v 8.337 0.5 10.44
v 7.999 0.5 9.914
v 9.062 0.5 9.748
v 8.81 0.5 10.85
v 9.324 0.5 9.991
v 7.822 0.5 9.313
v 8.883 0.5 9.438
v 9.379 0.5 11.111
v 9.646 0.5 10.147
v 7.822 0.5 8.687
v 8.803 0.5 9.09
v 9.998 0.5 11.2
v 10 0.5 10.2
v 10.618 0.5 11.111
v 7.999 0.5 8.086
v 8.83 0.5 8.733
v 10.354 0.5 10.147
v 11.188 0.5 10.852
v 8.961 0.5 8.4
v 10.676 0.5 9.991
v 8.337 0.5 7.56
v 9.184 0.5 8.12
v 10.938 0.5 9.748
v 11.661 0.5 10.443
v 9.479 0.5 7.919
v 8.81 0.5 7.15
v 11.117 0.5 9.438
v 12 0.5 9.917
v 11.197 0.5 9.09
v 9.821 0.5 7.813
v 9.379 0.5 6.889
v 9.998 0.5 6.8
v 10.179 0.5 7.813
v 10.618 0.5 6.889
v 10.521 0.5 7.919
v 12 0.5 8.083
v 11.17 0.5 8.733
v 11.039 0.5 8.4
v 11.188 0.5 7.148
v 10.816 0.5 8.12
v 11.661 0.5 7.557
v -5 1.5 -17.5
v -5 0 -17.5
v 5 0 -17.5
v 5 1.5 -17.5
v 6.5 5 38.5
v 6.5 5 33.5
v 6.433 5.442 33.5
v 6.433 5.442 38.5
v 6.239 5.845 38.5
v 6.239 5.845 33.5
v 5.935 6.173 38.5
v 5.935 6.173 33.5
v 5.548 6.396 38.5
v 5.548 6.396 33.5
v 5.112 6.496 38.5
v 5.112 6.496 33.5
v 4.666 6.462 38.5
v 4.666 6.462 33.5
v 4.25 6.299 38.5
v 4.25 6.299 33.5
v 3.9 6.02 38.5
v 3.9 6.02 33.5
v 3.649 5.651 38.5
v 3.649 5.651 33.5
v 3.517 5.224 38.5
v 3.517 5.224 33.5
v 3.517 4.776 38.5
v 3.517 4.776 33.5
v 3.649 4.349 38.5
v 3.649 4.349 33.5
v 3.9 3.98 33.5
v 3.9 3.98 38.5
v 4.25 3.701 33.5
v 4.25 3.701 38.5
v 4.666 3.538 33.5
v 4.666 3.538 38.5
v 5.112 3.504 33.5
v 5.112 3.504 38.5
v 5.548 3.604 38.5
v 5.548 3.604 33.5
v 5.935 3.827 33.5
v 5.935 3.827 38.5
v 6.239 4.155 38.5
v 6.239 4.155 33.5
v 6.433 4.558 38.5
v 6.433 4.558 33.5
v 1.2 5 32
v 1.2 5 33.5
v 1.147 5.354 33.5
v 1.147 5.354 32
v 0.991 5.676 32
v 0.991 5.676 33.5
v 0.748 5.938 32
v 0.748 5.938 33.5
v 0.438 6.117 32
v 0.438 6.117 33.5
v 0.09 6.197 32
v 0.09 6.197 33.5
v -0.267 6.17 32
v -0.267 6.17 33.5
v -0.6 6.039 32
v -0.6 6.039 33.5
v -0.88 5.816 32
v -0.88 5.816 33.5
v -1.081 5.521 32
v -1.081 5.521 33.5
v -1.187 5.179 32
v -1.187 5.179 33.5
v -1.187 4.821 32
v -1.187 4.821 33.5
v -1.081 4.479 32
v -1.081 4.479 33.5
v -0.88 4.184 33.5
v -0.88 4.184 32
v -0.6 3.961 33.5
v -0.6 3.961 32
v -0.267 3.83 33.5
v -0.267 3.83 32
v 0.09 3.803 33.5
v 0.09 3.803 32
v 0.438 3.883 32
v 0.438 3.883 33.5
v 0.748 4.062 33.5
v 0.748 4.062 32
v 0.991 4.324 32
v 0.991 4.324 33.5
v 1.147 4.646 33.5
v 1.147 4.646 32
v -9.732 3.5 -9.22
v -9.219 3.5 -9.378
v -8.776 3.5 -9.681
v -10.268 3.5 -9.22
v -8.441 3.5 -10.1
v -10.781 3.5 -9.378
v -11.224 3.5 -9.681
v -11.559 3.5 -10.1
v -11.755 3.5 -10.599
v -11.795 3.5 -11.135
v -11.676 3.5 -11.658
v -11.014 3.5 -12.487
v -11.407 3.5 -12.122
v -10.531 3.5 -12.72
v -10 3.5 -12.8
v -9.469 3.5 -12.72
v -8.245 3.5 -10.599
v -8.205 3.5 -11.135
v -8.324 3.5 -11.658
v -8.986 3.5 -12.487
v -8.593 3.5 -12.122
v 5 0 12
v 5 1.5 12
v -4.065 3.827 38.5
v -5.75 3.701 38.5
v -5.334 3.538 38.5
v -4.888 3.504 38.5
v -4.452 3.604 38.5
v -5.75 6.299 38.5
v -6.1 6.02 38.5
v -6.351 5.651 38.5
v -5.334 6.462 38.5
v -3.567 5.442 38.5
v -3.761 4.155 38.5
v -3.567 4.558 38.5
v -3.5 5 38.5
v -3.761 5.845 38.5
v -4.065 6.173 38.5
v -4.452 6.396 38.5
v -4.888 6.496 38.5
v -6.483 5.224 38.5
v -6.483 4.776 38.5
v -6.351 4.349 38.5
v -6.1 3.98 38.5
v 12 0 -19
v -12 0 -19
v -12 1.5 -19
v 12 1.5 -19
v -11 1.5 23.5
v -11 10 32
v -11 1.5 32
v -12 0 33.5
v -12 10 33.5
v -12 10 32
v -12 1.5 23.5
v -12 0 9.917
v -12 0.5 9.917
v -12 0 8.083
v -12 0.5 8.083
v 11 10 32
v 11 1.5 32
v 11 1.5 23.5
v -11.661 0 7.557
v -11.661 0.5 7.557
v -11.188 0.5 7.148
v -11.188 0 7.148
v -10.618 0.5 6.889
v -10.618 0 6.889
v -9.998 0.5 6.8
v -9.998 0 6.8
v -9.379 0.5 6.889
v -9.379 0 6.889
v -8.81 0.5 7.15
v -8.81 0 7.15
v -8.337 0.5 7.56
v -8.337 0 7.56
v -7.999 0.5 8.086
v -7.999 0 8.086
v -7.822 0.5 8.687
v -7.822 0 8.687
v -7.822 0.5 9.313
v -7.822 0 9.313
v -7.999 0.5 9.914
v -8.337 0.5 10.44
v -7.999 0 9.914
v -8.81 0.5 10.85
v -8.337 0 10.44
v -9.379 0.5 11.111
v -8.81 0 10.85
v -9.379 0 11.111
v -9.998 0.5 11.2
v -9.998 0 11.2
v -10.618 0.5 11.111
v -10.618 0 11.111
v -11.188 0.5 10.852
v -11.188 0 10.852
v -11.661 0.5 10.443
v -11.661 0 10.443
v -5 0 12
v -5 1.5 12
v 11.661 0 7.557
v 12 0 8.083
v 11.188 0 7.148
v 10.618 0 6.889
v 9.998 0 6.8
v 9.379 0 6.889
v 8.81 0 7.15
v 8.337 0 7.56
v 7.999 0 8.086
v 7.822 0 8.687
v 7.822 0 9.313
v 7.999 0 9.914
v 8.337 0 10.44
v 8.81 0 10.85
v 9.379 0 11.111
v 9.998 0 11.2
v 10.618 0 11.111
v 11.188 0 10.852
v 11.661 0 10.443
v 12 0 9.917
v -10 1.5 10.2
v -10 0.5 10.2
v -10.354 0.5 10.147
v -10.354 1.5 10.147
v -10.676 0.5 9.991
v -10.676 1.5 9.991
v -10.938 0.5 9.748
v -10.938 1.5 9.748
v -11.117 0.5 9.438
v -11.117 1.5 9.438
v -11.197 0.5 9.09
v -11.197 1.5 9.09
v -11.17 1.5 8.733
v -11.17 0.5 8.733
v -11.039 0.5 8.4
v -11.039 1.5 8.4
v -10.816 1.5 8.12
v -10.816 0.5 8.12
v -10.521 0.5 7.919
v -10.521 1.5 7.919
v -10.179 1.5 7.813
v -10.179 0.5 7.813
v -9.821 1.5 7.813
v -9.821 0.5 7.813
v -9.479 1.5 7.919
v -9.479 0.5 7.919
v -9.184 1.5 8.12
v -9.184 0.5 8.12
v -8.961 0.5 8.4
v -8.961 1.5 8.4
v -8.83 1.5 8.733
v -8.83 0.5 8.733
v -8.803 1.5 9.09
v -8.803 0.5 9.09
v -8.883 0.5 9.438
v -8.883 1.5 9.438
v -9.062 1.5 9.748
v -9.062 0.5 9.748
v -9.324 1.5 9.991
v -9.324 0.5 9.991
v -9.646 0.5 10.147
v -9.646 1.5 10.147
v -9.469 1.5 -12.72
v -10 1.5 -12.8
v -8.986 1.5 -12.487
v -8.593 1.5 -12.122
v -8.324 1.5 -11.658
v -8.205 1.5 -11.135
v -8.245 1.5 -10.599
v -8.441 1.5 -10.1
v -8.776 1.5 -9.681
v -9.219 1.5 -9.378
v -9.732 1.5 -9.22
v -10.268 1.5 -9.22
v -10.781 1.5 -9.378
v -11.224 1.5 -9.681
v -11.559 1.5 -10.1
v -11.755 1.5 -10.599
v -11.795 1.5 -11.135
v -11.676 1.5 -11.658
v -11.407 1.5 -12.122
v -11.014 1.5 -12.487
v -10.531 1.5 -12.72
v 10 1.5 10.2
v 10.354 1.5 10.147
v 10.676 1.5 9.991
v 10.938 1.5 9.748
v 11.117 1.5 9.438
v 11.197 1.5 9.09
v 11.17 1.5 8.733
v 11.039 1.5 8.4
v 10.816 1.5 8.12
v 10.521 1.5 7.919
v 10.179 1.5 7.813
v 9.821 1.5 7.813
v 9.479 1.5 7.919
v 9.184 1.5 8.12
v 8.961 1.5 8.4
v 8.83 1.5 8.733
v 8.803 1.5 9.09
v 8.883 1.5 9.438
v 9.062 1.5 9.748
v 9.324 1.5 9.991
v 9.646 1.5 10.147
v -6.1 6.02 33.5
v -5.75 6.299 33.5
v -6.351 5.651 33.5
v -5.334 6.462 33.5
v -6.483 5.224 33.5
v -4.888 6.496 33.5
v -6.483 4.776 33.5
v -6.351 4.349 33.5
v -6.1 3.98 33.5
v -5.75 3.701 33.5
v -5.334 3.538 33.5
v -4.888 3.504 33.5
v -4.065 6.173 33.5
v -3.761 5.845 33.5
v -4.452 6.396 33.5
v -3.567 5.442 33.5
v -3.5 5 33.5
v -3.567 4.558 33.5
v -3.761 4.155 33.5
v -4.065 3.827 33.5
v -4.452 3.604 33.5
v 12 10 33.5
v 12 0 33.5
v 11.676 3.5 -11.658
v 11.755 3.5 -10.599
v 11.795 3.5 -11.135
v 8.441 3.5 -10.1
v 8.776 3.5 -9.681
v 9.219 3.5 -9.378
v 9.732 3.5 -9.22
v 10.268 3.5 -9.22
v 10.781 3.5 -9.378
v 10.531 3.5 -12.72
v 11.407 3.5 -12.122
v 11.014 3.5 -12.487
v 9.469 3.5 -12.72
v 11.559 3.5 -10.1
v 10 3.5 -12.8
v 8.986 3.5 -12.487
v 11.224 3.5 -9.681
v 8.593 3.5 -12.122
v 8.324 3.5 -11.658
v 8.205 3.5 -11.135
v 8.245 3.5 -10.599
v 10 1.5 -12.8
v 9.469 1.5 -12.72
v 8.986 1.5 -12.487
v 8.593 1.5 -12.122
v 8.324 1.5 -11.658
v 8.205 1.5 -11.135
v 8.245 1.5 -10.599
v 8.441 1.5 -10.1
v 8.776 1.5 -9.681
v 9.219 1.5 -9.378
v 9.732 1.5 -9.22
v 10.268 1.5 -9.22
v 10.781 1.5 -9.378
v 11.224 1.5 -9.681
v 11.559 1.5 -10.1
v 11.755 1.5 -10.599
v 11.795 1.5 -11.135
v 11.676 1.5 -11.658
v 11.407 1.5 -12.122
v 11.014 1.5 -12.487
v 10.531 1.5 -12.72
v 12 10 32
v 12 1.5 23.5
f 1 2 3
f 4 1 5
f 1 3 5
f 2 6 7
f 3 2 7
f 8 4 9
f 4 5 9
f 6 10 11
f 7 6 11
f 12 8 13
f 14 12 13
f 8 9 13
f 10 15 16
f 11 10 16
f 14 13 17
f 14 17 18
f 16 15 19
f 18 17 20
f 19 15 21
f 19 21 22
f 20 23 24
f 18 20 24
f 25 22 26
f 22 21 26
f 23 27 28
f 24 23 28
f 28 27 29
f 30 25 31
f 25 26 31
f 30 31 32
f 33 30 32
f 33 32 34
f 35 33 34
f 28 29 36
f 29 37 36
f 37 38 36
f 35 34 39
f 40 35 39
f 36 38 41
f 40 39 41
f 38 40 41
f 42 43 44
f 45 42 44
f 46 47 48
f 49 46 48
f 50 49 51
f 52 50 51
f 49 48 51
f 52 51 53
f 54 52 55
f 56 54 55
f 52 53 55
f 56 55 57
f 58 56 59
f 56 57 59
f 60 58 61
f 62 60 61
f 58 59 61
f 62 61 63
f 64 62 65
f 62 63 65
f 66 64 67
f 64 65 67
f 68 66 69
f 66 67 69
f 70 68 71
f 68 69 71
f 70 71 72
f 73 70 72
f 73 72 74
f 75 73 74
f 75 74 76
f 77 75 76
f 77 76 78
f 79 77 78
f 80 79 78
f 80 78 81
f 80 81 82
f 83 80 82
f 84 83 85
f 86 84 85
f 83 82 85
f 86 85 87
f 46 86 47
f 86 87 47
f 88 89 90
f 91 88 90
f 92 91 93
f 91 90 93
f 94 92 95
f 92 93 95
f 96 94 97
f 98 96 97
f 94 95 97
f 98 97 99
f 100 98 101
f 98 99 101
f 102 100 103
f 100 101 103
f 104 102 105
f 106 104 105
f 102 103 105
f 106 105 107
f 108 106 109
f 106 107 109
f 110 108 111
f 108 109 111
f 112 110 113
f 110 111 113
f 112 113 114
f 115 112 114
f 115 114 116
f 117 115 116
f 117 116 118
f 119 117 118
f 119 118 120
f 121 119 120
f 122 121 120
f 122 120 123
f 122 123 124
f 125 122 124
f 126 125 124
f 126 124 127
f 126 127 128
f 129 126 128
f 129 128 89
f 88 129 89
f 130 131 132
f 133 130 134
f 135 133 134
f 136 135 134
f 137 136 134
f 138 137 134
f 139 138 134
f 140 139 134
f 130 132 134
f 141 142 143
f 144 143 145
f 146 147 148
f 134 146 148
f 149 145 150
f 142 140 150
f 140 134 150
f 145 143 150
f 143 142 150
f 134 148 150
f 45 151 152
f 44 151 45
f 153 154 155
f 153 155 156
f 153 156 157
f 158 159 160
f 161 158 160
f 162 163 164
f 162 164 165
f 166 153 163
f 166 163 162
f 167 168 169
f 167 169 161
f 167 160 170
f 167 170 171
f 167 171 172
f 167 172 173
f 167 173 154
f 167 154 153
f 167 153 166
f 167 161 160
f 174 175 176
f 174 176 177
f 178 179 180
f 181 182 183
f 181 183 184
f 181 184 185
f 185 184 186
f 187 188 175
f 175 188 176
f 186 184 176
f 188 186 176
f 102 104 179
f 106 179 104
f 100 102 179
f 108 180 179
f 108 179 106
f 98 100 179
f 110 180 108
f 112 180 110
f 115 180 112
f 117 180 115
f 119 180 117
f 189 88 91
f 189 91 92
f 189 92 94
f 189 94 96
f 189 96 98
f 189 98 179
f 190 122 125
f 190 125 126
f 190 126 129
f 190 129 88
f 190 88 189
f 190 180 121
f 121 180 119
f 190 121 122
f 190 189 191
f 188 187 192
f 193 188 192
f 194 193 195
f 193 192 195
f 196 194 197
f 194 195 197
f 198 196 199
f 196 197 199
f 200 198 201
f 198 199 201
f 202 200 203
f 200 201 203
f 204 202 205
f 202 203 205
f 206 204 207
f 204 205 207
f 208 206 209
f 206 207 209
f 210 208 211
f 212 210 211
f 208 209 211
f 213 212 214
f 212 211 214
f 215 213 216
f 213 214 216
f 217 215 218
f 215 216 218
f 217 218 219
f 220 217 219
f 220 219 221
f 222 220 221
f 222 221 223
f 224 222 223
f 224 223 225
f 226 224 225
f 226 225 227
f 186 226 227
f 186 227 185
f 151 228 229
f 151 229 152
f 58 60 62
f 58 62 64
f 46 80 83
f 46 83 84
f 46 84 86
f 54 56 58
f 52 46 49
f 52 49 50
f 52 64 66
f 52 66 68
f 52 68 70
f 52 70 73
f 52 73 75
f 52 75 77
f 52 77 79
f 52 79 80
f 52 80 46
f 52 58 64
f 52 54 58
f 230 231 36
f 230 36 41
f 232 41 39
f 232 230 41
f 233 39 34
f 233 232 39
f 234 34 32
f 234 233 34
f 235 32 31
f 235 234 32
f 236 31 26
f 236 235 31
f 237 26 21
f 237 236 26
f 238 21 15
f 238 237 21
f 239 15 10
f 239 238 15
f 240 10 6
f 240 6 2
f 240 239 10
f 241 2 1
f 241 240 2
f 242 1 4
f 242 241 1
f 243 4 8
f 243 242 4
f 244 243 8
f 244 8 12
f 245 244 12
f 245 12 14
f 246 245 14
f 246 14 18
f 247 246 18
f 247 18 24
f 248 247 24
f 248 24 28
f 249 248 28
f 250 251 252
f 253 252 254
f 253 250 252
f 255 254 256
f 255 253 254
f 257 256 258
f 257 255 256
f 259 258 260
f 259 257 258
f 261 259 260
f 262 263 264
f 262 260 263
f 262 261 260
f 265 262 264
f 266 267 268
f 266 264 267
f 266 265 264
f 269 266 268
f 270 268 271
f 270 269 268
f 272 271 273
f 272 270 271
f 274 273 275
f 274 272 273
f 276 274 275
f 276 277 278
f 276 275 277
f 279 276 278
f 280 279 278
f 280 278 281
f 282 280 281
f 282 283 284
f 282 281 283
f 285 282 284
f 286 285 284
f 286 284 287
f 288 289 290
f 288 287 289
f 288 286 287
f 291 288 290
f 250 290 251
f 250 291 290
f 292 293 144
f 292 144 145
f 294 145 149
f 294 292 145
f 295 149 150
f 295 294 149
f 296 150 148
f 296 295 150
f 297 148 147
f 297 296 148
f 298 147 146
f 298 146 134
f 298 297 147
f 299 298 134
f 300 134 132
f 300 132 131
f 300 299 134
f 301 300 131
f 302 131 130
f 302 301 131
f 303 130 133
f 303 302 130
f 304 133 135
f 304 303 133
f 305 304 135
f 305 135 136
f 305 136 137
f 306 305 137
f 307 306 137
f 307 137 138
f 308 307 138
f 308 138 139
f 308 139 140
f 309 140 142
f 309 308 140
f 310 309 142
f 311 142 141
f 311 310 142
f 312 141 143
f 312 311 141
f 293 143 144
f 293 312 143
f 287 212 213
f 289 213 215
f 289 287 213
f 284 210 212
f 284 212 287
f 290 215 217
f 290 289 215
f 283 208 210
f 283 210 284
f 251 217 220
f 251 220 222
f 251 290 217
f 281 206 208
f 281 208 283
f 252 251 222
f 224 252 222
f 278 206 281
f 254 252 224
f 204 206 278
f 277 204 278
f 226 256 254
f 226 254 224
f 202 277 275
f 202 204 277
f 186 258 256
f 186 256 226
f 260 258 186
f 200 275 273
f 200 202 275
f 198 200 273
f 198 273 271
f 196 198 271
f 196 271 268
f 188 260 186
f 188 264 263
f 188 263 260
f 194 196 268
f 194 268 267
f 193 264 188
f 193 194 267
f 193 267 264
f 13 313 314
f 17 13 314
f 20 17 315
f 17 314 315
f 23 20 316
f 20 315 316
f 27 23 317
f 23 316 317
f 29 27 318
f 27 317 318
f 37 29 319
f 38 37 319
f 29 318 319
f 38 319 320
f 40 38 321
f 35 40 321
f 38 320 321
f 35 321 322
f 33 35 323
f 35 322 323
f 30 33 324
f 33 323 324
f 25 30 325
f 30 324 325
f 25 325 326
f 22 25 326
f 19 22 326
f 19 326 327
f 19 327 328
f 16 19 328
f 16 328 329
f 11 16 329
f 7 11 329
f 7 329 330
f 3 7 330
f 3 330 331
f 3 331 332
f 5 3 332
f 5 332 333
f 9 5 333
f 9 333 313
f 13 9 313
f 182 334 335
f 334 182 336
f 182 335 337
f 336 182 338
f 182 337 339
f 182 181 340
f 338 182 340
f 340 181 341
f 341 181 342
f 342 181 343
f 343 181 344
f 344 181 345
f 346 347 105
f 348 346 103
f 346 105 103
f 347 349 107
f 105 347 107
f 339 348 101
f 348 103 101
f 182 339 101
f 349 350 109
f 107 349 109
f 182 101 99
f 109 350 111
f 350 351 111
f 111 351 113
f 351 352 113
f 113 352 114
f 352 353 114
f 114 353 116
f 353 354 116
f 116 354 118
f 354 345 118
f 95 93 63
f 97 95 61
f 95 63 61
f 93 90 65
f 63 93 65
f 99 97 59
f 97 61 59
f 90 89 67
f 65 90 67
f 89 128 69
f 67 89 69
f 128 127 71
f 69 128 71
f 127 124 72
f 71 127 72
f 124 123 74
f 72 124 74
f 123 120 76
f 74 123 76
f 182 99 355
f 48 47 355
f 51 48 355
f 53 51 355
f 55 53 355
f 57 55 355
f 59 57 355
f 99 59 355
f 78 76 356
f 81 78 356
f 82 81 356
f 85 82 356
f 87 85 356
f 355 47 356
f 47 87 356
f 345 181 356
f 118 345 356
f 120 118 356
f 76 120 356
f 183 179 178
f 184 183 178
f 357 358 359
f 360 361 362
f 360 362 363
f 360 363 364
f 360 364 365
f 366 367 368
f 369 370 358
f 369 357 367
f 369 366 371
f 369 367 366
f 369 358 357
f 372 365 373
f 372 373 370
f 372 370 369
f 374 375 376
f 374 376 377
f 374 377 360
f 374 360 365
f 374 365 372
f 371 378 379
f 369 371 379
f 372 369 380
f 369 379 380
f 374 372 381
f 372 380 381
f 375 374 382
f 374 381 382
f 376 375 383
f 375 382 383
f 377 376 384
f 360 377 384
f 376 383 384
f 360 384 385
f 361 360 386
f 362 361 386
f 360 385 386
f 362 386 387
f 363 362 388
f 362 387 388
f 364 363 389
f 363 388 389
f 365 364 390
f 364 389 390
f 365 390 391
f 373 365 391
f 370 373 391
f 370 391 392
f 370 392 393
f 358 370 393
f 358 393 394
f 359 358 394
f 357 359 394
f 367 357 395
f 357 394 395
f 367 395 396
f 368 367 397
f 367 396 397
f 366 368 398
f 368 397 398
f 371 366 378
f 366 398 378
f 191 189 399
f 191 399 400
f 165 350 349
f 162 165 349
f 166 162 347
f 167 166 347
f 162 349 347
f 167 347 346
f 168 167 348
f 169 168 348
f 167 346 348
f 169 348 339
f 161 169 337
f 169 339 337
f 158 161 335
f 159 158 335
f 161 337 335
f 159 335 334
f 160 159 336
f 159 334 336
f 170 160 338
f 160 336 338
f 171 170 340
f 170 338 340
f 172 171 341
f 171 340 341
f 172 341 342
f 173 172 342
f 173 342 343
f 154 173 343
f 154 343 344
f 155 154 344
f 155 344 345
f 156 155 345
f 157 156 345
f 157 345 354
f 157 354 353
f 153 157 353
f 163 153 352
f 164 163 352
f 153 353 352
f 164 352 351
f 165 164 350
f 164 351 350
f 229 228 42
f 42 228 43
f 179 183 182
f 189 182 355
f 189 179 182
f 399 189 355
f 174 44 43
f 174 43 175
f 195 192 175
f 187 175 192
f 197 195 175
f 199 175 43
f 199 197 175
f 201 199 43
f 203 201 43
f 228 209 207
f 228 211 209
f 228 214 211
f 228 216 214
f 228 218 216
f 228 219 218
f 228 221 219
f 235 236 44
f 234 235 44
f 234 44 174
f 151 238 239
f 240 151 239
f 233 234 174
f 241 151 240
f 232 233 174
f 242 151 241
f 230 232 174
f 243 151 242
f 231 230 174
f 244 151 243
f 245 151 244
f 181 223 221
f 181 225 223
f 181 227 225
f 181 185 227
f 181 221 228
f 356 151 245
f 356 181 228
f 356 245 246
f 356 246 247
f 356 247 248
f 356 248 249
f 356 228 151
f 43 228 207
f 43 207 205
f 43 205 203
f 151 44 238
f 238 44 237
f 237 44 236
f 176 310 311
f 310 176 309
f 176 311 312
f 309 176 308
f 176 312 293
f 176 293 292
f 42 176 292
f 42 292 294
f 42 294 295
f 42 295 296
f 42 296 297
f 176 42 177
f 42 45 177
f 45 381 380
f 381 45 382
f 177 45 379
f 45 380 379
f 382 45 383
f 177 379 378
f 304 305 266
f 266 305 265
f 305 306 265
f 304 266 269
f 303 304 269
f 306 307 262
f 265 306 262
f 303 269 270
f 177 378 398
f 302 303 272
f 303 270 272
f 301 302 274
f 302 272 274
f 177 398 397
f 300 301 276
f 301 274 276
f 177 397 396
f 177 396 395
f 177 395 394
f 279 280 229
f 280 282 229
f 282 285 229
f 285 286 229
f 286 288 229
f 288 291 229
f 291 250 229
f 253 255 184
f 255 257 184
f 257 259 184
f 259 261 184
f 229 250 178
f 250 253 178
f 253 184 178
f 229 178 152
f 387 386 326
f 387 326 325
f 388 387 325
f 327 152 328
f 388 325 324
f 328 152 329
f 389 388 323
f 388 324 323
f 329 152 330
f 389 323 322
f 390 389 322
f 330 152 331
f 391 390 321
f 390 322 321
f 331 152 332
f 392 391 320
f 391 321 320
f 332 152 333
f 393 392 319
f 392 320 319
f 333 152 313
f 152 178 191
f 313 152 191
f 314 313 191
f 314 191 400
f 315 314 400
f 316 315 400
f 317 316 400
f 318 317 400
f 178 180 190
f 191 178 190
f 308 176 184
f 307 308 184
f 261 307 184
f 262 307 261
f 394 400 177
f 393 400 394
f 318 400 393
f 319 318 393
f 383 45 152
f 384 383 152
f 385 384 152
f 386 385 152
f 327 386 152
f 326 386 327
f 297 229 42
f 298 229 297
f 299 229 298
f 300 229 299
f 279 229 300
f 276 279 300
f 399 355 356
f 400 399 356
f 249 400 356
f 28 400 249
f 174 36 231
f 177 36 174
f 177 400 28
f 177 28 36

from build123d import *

# Parameters (mm, degrees)
ESQUISSE1_W             = 24
ESQUISSE1_H             = 38
ESQUISSE1_W_2           = 10
ESQUISSE1_H_2           = 29.5
SHAPE_DEPTH             = 1.5
ESQUISSE2_R             = 1.2
VISHOLES_DEPTH          = 1.5
ESQUISSE3_R             = 1.8
LOCKERS_DEPTH           = 2
ESQUISSE4_R             = 2.2
SCREWHATREMOVER_DEPTH   = 0.5
ESQUISSE6_W             = 24
ESQUISSE6_H             = 14.5
RALLONGE_DEPTH          = 1.5
ESQUISSE7_W             = 24
ESQUISSE7_H             = 1.5
BOSS_EXTRU_2_DEPTH      = 8.5
ESQUISSE8_R             = 1.2
ENL_V_MAT_EXTRU_1_DEPTH = 10
ESQUISSE9_R             = 1.5
BOSS_EXTRU_3_DEPTH      = 5
NERVURE11_REACH         = 48.457
ESQUISSE12_WALL_W       = 106.934753954
ESQUISSE12_WALL_H       = 1


with BuildPart() as part:
    # Esquisse1 → Shape (new body)
    with BuildSketch(Plane(origin=(0, 0, 0), x_dir=(1, 0, 0), z_dir=(0, 1, 0))):
        Rectangle(ESQUISSE1_W, ESQUISSE1_H)
        with Locations((0, 2.75)):
            Rectangle(ESQUISSE1_W_2, ESQUISSE1_H_2, mode=Mode.SUBTRACT)
    extrude(amount=SHAPE_DEPTH)

    # Esquisse2 → VisHoles (cut)
    with BuildSketch(Plane(origin=(0, 1.5, 0), x_dir=(1, 0, 0), z_dir=(0, 1, 0))):
        with Locations(Location((10, -9, 0), (0, 0, 270))):
            Circle(ESQUISSE2_R)
    visholes = extrude(amount=-VISHOLES_DEPTH, mode=Mode.SUBTRACT)

    # Esquisse3 → Lockers (add)
    with BuildSketch(Plane(origin=(0, 1.5, 0), x_dir=(1, 0, 0), z_dir=(0, 1, 0))):
        with Locations(Location((10, 11, 0), (0, 0, 90))):
            Circle(ESQUISSE3_R)
    lockers = extrude(amount=LOCKERS_DEPTH)

    # Esquisse4 → ScrewHatRemover (cut)
    with BuildSketch(Plane(origin=(0, 0, 0), x_dir=(1, 0, 0), z_dir=(0, 1, 0))):
        with Locations((10, -9)):
            Circle(ESQUISSE4_R)
    screwhatremover = extrude(amount=SCREWHATREMOVER_DEPTH, mode=Mode.SUBTRACT)

    # Symétrie1: VisHoles, Lockers, ScrewHatRemover across plane
    add(visholes.mirror(Plane(origin=(0, 0, 0), x_dir=(0, 0, 1), z_dir=(1, 0, 0))), mode=Mode.SUBTRACT)
    add(lockers.mirror(Plane(origin=(0, 0, 0), x_dir=(0, 0, 1), z_dir=(1, 0, 0))))
    add(screwhatremover.mirror(Plane(origin=(0, 0, 0), x_dir=(0, 0, 1), z_dir=(1, 0, 0))), mode=Mode.SUBTRACT)

    # Esquisse6 → Rallonge (add)
    with BuildSketch(Plane.XZ):
        with Locations((0, 26.25)):
            Rectangle(ESQUISSE6_W, ESQUISSE6_H)
    extrude(amount=-RALLONGE_DEPTH)

    # Esquisse7 → Boss.-Extru.2 (add)
    with BuildSketch(Plane(origin=(0, 1.5, 0), x_dir=(1, 0, 0), z_dir=(0, 1, 0))):
        with Locations((0, -32.75)):
            Rectangle(ESQUISSE7_W, ESQUISSE7_H)
    extrude(amount=BOSS_EXTRU_2_DEPTH)

    # Esquisse8 → Enlèv. mat.-Extru.1 (cut)
    with BuildSketch(Plane.XY.offset(33.5)):
        with Locations((0, 5)):
            Circle(ESQUISSE8_R)
    extrude(amount=-ENL_V_MAT_EXTRU_1_DEPTH, mode=Mode.SUBTRACT)

    # Esquisse9 → Boss.-Extru.3 (add)
    with BuildSketch(Plane.XY.offset(33.5)):
        with Locations((5, 5)):
            Circle(ESQUISSE9_R)
        with Locations((-5, 5)):
            Circle(ESQUISSE9_R)
    extrude(amount=BOSS_EXTRU_3_DEPTH)

    # Esquisse12 wall → Nervure11 (add, up to next)
    with BuildSketch(Plane(origin=(-12, 5.75, 27.75), x_dir=(0, -0.707106781187, -0.707106781187), z_dir=(0, -0.707106781187, 0.707106781187)), mode=Mode.PRIVATE) as nervure11_sk1:
        with Locations((0, 0.5)):
            Rectangle(ESQUISSE12_WALL_W, ESQUISSE12_WALL_H)
    nervure11_tool1 = extrude(nervure11_sk1.sketch, amount=NERVURE11_REACH, mode=Mode.PRIVATE) - part.part
    nervure11 = nervure11_tool1.solids().sort_by_distance((-12, 5.75, 27.75))[0]
    add(nervure11)

    # Symétrie2: Nervure11 across plane
    add(nervure11.mirror(Plane(origin=(0, 0, 0), x_dir=(0, 0, 1), z_dir=(1, 0, 0))))


solid = part.part
